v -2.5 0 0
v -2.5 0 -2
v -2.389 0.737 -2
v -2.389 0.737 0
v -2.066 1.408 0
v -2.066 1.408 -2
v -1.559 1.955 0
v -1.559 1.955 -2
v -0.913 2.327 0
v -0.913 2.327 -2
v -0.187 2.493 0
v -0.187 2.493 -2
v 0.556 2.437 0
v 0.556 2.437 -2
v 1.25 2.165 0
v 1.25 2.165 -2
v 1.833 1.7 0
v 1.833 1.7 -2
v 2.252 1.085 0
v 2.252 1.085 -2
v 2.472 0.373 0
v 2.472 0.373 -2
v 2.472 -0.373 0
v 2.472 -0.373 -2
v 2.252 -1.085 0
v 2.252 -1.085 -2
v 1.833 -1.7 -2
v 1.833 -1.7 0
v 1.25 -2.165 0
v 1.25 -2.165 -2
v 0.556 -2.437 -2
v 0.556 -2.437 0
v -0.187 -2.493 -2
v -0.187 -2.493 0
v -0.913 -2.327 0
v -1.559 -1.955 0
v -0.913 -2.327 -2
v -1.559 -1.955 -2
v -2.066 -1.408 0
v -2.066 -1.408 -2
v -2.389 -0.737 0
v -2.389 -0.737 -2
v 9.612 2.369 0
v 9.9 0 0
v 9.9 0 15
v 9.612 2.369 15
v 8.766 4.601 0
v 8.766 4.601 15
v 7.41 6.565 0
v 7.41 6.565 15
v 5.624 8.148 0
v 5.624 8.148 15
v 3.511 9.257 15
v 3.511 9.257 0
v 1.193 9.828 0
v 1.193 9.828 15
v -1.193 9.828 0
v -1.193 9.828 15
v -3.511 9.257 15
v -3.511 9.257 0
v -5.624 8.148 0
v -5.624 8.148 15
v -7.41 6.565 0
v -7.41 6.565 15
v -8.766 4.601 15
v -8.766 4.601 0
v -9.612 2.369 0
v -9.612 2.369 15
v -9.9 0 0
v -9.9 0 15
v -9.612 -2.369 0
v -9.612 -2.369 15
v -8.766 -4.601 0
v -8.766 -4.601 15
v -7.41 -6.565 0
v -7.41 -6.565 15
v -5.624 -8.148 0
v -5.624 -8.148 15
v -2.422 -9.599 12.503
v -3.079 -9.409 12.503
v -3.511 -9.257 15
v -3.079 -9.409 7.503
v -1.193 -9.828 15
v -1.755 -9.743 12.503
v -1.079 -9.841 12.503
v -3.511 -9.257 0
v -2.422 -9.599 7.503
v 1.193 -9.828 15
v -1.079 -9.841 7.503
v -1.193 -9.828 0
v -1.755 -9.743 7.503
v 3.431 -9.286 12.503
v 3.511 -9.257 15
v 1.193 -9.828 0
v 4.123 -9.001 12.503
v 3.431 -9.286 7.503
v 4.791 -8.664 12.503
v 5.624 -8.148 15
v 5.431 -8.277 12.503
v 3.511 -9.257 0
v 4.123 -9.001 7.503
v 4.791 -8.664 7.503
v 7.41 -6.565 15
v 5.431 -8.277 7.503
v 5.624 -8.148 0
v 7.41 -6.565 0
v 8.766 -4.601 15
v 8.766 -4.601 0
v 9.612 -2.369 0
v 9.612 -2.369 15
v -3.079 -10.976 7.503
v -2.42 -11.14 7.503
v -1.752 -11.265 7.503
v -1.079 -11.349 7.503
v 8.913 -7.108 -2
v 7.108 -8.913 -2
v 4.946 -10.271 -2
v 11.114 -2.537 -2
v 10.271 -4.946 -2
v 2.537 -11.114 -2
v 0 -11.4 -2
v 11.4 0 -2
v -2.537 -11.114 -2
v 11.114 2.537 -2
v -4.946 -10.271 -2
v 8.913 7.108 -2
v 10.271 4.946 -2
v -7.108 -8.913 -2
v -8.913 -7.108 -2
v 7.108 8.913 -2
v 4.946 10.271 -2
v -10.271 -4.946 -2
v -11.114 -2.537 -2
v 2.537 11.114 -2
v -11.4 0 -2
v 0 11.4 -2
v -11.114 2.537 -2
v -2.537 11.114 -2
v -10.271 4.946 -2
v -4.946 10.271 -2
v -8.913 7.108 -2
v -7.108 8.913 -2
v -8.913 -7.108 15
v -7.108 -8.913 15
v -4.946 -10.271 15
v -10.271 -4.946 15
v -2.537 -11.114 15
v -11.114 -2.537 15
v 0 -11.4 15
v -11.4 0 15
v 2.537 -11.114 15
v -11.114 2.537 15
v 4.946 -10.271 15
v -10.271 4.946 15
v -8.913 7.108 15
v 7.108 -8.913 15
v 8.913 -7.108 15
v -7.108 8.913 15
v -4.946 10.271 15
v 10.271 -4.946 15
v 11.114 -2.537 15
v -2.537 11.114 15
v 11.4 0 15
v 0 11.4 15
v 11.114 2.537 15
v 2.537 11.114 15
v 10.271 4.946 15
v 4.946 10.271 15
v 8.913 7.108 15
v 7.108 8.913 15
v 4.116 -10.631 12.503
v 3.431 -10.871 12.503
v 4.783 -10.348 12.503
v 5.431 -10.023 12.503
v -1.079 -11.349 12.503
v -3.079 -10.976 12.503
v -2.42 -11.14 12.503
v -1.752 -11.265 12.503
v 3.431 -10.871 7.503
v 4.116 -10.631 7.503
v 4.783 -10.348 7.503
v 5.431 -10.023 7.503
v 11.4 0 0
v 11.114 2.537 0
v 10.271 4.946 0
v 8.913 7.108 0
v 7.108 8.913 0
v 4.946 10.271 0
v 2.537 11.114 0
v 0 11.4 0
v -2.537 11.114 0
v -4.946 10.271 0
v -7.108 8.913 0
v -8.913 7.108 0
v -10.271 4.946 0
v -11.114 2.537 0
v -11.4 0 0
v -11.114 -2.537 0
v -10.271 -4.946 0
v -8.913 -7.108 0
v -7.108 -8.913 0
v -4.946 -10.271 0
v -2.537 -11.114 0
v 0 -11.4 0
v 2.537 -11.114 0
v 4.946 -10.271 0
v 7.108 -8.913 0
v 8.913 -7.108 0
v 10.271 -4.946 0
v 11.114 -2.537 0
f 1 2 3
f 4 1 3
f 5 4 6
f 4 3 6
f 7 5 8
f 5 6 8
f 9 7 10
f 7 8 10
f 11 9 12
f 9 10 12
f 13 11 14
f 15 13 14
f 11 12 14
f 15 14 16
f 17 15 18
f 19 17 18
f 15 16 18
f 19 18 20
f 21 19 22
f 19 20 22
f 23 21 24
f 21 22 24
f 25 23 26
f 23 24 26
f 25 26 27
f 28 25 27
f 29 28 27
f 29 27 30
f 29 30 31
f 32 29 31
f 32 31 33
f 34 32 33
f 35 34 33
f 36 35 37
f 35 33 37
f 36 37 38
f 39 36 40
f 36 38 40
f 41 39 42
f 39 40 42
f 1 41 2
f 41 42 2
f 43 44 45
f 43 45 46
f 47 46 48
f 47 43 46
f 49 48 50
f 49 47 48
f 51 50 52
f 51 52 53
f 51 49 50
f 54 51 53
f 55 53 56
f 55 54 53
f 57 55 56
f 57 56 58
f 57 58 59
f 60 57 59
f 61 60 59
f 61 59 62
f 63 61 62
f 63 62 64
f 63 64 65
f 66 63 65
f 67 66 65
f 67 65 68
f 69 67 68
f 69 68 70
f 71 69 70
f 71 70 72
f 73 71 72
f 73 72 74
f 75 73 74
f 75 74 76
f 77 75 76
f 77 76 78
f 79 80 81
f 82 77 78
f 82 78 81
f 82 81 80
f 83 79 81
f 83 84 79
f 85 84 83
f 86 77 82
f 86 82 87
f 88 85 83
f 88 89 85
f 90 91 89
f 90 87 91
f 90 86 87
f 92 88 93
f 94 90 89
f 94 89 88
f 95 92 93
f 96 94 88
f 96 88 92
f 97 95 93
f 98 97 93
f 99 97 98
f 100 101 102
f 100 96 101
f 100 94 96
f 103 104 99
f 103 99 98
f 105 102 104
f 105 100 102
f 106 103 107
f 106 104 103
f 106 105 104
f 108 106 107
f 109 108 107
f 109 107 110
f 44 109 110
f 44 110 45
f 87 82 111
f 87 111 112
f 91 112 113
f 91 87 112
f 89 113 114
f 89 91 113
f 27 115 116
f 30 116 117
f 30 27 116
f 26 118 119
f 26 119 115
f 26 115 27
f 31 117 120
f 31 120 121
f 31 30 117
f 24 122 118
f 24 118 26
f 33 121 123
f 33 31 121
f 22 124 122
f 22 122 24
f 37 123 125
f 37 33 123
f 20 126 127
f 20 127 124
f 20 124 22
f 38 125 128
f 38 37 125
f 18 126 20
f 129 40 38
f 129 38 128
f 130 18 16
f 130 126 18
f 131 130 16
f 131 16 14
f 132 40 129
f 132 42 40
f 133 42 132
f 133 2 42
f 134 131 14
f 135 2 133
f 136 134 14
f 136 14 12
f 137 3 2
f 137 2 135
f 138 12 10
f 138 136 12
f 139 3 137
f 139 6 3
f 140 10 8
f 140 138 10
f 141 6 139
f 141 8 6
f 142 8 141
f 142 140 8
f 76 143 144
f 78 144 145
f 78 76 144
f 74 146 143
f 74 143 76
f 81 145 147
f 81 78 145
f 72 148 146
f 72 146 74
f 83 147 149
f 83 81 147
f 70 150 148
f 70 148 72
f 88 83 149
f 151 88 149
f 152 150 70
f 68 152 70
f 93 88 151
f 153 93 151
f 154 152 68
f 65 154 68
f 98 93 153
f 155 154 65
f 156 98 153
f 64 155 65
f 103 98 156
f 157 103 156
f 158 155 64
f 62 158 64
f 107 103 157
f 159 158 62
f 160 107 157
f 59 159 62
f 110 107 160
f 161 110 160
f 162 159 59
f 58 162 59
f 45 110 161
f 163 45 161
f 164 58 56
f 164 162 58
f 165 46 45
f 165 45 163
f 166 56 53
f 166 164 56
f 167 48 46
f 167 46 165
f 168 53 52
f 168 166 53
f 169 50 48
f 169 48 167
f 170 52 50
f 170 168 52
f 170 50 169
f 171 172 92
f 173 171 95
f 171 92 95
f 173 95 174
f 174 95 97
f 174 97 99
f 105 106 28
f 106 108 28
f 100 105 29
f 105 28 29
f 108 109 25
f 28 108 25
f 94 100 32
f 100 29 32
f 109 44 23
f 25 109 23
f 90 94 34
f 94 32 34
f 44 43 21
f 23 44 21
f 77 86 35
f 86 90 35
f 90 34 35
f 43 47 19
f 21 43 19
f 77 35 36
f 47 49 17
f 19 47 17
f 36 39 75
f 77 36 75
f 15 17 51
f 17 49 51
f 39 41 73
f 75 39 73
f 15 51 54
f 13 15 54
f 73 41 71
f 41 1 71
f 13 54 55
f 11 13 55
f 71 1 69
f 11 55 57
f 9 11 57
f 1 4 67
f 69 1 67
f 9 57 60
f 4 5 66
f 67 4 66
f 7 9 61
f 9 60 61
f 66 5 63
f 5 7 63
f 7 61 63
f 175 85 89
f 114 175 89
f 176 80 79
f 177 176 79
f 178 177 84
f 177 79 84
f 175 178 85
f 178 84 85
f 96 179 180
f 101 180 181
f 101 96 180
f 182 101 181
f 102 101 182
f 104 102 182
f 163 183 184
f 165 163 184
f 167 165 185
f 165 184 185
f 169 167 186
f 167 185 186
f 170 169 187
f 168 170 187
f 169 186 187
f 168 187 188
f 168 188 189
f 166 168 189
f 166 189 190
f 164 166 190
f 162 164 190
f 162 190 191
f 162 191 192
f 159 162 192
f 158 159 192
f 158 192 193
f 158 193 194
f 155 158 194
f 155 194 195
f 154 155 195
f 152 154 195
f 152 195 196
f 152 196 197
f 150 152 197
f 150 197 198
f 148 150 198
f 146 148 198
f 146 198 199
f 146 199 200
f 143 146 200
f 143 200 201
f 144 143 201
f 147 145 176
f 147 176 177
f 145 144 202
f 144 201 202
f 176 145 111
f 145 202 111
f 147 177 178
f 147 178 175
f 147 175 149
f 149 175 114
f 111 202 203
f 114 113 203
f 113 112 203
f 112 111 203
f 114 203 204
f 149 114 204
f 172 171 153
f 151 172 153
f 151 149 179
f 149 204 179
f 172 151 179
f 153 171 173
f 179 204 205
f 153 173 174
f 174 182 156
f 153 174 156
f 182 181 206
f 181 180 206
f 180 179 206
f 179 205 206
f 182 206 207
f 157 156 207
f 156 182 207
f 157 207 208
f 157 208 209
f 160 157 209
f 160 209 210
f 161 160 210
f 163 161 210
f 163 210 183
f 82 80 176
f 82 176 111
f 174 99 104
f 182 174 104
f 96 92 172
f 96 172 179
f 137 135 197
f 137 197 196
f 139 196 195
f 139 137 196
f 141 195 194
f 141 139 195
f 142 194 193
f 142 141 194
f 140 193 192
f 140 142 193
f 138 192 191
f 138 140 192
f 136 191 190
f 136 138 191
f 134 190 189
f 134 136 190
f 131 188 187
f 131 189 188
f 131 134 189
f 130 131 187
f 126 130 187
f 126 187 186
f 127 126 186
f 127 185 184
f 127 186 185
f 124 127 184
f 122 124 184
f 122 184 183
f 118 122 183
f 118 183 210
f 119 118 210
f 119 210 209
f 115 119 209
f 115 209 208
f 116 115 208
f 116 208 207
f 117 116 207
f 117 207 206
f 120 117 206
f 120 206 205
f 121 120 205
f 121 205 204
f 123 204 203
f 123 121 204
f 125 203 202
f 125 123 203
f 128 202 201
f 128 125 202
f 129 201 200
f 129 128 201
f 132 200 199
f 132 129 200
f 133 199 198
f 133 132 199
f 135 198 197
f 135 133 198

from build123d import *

# Parameters (mm, degrees)
ESQUISSE1_R             = 11.4
ESQUISSE1_R_2           = 9.9
BOSS_EXTRU_1_DEPTH      = 15
BOSS_EXTRU_2_START      = 2
ESQUISSE2_R             = 11.4
ESQUISSE2_R_2           = 2.5
BOSS_EXTRU_2_DEPTH      = 2
ESQUISSE3_W             = 2
ESQUISSE3_H             = 5
ENL_V_MAT_EXTRU_1_DEPTH = 21


with BuildPart() as part:
    # Esquisse1 → Boss.-Extru.1 (new body)
    with BuildSketch(Plane.XY):
        Circle(ESQUISSE1_R)
        Circle(ESQUISSE1_R_2, mode=Mode.SUBTRACT)
    extrude(amount=BOSS_EXTRU_1_DEPTH)

    # Esquisse2 → Boss.-Extru.2 (add)
    with BuildSketch(Plane(origin=(0, 0, 0), x_dir=(-1, 0, 0), z_dir=(0, 0, -1)).offset(BOSS_EXTRU_2_START)):
        Circle(ESQUISSE2_R)
        Circle(ESQUISSE2_R_2, mode=Mode.SUBTRACT)
    extrude(amount=-BOSS_EXTRU_2_DEPTH)

    # Esquisse3 → Enlèv. mat.-Extru.1 (cut)
    with BuildSketch(Plane(origin=(0, 0, 0), x_dir=(1, 0, 0), z_dir=(0, 1, 0))):
        with Locations((4.431290854, -10.002963211)):
            Rectangle(ESQUISSE3_W, ESQUISSE3_H)
        with Locations((-2.078658243, -10.002963211)):
            Rectangle(ESQUISSE3_W, ESQUISSE3_H)
    extrude(amount=-ENL_V_MAT_EXTRU_1_DEPTH, mode=Mode.SUBTRACT)


solid = part.part
